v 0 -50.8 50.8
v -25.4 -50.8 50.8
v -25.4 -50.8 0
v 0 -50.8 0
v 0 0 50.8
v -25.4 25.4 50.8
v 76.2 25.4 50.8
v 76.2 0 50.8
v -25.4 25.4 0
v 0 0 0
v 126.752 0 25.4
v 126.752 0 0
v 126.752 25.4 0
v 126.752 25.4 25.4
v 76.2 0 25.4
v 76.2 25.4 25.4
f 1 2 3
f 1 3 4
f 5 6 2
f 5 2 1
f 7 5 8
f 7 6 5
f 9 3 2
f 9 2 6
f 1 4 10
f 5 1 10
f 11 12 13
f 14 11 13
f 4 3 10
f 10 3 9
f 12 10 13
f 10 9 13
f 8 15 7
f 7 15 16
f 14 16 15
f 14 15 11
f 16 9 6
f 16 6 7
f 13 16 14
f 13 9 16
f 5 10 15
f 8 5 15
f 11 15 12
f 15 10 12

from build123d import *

# Parameters (mm, degrees)
F0_W      = 25.4
F0_H      = 50.8
F3_DEPTH  = 50.8
F1_W      = 25.4
F1_H      = 25.4
F4_DEPTH  = 50.8
F2_W      = 76.2
F2_H      = 25.4
F5_DEPTH  = 25.4
F5_FACE_W = 76.2
F5_FACE_H = 25.4
F6_DEPTH  = 25.4
F7_W      = 50.8
F7_H      = 25.4
F8_DEPTH  = 25.4


with BuildPart() as f3:
    # F0 (on Top) → F3 (new body)
    with BuildSketch(Plane.XY):
        with Locations((-12.7, -25.4)):
            Rectangle(F0_W, F0_H)
    extrude(amount=F3_DEPTH)

    # F1 (on Top) → F4 (join)
    with BuildSketch(Plane.XY):
        with Locations((-12.7, 12.7)):
            Rectangle(F1_W, F1_H)
    extrude(amount=F4_DEPTH)

    # F2 (on Top) → F5 (join)
    with BuildSketch(Plane.XY):
        with Locations((38.1, 12.7)):
            Rectangle(F2_W, F2_H)
    extrude(amount=F5_DEPTH)

    # F5_face (on face) → F6 (join)
    with BuildSketch(Plane(origin=(38.1, 12.7, 25.4), x_dir=(1, 0, 0), z_dir=(0, 0, 1))):
        Rectangle(F5_FACE_W, F5_FACE_H)
    extrude(amount=F6_DEPTH)

    # F7 (on Top) → F8 (join)
    with BuildSketch(Plane.XY):
        with Locations((101.3518, 12.7)):
            Rectangle(F7_W, F7_H)
    extrude(amount=F8_DEPTH)


solid = f3.part
